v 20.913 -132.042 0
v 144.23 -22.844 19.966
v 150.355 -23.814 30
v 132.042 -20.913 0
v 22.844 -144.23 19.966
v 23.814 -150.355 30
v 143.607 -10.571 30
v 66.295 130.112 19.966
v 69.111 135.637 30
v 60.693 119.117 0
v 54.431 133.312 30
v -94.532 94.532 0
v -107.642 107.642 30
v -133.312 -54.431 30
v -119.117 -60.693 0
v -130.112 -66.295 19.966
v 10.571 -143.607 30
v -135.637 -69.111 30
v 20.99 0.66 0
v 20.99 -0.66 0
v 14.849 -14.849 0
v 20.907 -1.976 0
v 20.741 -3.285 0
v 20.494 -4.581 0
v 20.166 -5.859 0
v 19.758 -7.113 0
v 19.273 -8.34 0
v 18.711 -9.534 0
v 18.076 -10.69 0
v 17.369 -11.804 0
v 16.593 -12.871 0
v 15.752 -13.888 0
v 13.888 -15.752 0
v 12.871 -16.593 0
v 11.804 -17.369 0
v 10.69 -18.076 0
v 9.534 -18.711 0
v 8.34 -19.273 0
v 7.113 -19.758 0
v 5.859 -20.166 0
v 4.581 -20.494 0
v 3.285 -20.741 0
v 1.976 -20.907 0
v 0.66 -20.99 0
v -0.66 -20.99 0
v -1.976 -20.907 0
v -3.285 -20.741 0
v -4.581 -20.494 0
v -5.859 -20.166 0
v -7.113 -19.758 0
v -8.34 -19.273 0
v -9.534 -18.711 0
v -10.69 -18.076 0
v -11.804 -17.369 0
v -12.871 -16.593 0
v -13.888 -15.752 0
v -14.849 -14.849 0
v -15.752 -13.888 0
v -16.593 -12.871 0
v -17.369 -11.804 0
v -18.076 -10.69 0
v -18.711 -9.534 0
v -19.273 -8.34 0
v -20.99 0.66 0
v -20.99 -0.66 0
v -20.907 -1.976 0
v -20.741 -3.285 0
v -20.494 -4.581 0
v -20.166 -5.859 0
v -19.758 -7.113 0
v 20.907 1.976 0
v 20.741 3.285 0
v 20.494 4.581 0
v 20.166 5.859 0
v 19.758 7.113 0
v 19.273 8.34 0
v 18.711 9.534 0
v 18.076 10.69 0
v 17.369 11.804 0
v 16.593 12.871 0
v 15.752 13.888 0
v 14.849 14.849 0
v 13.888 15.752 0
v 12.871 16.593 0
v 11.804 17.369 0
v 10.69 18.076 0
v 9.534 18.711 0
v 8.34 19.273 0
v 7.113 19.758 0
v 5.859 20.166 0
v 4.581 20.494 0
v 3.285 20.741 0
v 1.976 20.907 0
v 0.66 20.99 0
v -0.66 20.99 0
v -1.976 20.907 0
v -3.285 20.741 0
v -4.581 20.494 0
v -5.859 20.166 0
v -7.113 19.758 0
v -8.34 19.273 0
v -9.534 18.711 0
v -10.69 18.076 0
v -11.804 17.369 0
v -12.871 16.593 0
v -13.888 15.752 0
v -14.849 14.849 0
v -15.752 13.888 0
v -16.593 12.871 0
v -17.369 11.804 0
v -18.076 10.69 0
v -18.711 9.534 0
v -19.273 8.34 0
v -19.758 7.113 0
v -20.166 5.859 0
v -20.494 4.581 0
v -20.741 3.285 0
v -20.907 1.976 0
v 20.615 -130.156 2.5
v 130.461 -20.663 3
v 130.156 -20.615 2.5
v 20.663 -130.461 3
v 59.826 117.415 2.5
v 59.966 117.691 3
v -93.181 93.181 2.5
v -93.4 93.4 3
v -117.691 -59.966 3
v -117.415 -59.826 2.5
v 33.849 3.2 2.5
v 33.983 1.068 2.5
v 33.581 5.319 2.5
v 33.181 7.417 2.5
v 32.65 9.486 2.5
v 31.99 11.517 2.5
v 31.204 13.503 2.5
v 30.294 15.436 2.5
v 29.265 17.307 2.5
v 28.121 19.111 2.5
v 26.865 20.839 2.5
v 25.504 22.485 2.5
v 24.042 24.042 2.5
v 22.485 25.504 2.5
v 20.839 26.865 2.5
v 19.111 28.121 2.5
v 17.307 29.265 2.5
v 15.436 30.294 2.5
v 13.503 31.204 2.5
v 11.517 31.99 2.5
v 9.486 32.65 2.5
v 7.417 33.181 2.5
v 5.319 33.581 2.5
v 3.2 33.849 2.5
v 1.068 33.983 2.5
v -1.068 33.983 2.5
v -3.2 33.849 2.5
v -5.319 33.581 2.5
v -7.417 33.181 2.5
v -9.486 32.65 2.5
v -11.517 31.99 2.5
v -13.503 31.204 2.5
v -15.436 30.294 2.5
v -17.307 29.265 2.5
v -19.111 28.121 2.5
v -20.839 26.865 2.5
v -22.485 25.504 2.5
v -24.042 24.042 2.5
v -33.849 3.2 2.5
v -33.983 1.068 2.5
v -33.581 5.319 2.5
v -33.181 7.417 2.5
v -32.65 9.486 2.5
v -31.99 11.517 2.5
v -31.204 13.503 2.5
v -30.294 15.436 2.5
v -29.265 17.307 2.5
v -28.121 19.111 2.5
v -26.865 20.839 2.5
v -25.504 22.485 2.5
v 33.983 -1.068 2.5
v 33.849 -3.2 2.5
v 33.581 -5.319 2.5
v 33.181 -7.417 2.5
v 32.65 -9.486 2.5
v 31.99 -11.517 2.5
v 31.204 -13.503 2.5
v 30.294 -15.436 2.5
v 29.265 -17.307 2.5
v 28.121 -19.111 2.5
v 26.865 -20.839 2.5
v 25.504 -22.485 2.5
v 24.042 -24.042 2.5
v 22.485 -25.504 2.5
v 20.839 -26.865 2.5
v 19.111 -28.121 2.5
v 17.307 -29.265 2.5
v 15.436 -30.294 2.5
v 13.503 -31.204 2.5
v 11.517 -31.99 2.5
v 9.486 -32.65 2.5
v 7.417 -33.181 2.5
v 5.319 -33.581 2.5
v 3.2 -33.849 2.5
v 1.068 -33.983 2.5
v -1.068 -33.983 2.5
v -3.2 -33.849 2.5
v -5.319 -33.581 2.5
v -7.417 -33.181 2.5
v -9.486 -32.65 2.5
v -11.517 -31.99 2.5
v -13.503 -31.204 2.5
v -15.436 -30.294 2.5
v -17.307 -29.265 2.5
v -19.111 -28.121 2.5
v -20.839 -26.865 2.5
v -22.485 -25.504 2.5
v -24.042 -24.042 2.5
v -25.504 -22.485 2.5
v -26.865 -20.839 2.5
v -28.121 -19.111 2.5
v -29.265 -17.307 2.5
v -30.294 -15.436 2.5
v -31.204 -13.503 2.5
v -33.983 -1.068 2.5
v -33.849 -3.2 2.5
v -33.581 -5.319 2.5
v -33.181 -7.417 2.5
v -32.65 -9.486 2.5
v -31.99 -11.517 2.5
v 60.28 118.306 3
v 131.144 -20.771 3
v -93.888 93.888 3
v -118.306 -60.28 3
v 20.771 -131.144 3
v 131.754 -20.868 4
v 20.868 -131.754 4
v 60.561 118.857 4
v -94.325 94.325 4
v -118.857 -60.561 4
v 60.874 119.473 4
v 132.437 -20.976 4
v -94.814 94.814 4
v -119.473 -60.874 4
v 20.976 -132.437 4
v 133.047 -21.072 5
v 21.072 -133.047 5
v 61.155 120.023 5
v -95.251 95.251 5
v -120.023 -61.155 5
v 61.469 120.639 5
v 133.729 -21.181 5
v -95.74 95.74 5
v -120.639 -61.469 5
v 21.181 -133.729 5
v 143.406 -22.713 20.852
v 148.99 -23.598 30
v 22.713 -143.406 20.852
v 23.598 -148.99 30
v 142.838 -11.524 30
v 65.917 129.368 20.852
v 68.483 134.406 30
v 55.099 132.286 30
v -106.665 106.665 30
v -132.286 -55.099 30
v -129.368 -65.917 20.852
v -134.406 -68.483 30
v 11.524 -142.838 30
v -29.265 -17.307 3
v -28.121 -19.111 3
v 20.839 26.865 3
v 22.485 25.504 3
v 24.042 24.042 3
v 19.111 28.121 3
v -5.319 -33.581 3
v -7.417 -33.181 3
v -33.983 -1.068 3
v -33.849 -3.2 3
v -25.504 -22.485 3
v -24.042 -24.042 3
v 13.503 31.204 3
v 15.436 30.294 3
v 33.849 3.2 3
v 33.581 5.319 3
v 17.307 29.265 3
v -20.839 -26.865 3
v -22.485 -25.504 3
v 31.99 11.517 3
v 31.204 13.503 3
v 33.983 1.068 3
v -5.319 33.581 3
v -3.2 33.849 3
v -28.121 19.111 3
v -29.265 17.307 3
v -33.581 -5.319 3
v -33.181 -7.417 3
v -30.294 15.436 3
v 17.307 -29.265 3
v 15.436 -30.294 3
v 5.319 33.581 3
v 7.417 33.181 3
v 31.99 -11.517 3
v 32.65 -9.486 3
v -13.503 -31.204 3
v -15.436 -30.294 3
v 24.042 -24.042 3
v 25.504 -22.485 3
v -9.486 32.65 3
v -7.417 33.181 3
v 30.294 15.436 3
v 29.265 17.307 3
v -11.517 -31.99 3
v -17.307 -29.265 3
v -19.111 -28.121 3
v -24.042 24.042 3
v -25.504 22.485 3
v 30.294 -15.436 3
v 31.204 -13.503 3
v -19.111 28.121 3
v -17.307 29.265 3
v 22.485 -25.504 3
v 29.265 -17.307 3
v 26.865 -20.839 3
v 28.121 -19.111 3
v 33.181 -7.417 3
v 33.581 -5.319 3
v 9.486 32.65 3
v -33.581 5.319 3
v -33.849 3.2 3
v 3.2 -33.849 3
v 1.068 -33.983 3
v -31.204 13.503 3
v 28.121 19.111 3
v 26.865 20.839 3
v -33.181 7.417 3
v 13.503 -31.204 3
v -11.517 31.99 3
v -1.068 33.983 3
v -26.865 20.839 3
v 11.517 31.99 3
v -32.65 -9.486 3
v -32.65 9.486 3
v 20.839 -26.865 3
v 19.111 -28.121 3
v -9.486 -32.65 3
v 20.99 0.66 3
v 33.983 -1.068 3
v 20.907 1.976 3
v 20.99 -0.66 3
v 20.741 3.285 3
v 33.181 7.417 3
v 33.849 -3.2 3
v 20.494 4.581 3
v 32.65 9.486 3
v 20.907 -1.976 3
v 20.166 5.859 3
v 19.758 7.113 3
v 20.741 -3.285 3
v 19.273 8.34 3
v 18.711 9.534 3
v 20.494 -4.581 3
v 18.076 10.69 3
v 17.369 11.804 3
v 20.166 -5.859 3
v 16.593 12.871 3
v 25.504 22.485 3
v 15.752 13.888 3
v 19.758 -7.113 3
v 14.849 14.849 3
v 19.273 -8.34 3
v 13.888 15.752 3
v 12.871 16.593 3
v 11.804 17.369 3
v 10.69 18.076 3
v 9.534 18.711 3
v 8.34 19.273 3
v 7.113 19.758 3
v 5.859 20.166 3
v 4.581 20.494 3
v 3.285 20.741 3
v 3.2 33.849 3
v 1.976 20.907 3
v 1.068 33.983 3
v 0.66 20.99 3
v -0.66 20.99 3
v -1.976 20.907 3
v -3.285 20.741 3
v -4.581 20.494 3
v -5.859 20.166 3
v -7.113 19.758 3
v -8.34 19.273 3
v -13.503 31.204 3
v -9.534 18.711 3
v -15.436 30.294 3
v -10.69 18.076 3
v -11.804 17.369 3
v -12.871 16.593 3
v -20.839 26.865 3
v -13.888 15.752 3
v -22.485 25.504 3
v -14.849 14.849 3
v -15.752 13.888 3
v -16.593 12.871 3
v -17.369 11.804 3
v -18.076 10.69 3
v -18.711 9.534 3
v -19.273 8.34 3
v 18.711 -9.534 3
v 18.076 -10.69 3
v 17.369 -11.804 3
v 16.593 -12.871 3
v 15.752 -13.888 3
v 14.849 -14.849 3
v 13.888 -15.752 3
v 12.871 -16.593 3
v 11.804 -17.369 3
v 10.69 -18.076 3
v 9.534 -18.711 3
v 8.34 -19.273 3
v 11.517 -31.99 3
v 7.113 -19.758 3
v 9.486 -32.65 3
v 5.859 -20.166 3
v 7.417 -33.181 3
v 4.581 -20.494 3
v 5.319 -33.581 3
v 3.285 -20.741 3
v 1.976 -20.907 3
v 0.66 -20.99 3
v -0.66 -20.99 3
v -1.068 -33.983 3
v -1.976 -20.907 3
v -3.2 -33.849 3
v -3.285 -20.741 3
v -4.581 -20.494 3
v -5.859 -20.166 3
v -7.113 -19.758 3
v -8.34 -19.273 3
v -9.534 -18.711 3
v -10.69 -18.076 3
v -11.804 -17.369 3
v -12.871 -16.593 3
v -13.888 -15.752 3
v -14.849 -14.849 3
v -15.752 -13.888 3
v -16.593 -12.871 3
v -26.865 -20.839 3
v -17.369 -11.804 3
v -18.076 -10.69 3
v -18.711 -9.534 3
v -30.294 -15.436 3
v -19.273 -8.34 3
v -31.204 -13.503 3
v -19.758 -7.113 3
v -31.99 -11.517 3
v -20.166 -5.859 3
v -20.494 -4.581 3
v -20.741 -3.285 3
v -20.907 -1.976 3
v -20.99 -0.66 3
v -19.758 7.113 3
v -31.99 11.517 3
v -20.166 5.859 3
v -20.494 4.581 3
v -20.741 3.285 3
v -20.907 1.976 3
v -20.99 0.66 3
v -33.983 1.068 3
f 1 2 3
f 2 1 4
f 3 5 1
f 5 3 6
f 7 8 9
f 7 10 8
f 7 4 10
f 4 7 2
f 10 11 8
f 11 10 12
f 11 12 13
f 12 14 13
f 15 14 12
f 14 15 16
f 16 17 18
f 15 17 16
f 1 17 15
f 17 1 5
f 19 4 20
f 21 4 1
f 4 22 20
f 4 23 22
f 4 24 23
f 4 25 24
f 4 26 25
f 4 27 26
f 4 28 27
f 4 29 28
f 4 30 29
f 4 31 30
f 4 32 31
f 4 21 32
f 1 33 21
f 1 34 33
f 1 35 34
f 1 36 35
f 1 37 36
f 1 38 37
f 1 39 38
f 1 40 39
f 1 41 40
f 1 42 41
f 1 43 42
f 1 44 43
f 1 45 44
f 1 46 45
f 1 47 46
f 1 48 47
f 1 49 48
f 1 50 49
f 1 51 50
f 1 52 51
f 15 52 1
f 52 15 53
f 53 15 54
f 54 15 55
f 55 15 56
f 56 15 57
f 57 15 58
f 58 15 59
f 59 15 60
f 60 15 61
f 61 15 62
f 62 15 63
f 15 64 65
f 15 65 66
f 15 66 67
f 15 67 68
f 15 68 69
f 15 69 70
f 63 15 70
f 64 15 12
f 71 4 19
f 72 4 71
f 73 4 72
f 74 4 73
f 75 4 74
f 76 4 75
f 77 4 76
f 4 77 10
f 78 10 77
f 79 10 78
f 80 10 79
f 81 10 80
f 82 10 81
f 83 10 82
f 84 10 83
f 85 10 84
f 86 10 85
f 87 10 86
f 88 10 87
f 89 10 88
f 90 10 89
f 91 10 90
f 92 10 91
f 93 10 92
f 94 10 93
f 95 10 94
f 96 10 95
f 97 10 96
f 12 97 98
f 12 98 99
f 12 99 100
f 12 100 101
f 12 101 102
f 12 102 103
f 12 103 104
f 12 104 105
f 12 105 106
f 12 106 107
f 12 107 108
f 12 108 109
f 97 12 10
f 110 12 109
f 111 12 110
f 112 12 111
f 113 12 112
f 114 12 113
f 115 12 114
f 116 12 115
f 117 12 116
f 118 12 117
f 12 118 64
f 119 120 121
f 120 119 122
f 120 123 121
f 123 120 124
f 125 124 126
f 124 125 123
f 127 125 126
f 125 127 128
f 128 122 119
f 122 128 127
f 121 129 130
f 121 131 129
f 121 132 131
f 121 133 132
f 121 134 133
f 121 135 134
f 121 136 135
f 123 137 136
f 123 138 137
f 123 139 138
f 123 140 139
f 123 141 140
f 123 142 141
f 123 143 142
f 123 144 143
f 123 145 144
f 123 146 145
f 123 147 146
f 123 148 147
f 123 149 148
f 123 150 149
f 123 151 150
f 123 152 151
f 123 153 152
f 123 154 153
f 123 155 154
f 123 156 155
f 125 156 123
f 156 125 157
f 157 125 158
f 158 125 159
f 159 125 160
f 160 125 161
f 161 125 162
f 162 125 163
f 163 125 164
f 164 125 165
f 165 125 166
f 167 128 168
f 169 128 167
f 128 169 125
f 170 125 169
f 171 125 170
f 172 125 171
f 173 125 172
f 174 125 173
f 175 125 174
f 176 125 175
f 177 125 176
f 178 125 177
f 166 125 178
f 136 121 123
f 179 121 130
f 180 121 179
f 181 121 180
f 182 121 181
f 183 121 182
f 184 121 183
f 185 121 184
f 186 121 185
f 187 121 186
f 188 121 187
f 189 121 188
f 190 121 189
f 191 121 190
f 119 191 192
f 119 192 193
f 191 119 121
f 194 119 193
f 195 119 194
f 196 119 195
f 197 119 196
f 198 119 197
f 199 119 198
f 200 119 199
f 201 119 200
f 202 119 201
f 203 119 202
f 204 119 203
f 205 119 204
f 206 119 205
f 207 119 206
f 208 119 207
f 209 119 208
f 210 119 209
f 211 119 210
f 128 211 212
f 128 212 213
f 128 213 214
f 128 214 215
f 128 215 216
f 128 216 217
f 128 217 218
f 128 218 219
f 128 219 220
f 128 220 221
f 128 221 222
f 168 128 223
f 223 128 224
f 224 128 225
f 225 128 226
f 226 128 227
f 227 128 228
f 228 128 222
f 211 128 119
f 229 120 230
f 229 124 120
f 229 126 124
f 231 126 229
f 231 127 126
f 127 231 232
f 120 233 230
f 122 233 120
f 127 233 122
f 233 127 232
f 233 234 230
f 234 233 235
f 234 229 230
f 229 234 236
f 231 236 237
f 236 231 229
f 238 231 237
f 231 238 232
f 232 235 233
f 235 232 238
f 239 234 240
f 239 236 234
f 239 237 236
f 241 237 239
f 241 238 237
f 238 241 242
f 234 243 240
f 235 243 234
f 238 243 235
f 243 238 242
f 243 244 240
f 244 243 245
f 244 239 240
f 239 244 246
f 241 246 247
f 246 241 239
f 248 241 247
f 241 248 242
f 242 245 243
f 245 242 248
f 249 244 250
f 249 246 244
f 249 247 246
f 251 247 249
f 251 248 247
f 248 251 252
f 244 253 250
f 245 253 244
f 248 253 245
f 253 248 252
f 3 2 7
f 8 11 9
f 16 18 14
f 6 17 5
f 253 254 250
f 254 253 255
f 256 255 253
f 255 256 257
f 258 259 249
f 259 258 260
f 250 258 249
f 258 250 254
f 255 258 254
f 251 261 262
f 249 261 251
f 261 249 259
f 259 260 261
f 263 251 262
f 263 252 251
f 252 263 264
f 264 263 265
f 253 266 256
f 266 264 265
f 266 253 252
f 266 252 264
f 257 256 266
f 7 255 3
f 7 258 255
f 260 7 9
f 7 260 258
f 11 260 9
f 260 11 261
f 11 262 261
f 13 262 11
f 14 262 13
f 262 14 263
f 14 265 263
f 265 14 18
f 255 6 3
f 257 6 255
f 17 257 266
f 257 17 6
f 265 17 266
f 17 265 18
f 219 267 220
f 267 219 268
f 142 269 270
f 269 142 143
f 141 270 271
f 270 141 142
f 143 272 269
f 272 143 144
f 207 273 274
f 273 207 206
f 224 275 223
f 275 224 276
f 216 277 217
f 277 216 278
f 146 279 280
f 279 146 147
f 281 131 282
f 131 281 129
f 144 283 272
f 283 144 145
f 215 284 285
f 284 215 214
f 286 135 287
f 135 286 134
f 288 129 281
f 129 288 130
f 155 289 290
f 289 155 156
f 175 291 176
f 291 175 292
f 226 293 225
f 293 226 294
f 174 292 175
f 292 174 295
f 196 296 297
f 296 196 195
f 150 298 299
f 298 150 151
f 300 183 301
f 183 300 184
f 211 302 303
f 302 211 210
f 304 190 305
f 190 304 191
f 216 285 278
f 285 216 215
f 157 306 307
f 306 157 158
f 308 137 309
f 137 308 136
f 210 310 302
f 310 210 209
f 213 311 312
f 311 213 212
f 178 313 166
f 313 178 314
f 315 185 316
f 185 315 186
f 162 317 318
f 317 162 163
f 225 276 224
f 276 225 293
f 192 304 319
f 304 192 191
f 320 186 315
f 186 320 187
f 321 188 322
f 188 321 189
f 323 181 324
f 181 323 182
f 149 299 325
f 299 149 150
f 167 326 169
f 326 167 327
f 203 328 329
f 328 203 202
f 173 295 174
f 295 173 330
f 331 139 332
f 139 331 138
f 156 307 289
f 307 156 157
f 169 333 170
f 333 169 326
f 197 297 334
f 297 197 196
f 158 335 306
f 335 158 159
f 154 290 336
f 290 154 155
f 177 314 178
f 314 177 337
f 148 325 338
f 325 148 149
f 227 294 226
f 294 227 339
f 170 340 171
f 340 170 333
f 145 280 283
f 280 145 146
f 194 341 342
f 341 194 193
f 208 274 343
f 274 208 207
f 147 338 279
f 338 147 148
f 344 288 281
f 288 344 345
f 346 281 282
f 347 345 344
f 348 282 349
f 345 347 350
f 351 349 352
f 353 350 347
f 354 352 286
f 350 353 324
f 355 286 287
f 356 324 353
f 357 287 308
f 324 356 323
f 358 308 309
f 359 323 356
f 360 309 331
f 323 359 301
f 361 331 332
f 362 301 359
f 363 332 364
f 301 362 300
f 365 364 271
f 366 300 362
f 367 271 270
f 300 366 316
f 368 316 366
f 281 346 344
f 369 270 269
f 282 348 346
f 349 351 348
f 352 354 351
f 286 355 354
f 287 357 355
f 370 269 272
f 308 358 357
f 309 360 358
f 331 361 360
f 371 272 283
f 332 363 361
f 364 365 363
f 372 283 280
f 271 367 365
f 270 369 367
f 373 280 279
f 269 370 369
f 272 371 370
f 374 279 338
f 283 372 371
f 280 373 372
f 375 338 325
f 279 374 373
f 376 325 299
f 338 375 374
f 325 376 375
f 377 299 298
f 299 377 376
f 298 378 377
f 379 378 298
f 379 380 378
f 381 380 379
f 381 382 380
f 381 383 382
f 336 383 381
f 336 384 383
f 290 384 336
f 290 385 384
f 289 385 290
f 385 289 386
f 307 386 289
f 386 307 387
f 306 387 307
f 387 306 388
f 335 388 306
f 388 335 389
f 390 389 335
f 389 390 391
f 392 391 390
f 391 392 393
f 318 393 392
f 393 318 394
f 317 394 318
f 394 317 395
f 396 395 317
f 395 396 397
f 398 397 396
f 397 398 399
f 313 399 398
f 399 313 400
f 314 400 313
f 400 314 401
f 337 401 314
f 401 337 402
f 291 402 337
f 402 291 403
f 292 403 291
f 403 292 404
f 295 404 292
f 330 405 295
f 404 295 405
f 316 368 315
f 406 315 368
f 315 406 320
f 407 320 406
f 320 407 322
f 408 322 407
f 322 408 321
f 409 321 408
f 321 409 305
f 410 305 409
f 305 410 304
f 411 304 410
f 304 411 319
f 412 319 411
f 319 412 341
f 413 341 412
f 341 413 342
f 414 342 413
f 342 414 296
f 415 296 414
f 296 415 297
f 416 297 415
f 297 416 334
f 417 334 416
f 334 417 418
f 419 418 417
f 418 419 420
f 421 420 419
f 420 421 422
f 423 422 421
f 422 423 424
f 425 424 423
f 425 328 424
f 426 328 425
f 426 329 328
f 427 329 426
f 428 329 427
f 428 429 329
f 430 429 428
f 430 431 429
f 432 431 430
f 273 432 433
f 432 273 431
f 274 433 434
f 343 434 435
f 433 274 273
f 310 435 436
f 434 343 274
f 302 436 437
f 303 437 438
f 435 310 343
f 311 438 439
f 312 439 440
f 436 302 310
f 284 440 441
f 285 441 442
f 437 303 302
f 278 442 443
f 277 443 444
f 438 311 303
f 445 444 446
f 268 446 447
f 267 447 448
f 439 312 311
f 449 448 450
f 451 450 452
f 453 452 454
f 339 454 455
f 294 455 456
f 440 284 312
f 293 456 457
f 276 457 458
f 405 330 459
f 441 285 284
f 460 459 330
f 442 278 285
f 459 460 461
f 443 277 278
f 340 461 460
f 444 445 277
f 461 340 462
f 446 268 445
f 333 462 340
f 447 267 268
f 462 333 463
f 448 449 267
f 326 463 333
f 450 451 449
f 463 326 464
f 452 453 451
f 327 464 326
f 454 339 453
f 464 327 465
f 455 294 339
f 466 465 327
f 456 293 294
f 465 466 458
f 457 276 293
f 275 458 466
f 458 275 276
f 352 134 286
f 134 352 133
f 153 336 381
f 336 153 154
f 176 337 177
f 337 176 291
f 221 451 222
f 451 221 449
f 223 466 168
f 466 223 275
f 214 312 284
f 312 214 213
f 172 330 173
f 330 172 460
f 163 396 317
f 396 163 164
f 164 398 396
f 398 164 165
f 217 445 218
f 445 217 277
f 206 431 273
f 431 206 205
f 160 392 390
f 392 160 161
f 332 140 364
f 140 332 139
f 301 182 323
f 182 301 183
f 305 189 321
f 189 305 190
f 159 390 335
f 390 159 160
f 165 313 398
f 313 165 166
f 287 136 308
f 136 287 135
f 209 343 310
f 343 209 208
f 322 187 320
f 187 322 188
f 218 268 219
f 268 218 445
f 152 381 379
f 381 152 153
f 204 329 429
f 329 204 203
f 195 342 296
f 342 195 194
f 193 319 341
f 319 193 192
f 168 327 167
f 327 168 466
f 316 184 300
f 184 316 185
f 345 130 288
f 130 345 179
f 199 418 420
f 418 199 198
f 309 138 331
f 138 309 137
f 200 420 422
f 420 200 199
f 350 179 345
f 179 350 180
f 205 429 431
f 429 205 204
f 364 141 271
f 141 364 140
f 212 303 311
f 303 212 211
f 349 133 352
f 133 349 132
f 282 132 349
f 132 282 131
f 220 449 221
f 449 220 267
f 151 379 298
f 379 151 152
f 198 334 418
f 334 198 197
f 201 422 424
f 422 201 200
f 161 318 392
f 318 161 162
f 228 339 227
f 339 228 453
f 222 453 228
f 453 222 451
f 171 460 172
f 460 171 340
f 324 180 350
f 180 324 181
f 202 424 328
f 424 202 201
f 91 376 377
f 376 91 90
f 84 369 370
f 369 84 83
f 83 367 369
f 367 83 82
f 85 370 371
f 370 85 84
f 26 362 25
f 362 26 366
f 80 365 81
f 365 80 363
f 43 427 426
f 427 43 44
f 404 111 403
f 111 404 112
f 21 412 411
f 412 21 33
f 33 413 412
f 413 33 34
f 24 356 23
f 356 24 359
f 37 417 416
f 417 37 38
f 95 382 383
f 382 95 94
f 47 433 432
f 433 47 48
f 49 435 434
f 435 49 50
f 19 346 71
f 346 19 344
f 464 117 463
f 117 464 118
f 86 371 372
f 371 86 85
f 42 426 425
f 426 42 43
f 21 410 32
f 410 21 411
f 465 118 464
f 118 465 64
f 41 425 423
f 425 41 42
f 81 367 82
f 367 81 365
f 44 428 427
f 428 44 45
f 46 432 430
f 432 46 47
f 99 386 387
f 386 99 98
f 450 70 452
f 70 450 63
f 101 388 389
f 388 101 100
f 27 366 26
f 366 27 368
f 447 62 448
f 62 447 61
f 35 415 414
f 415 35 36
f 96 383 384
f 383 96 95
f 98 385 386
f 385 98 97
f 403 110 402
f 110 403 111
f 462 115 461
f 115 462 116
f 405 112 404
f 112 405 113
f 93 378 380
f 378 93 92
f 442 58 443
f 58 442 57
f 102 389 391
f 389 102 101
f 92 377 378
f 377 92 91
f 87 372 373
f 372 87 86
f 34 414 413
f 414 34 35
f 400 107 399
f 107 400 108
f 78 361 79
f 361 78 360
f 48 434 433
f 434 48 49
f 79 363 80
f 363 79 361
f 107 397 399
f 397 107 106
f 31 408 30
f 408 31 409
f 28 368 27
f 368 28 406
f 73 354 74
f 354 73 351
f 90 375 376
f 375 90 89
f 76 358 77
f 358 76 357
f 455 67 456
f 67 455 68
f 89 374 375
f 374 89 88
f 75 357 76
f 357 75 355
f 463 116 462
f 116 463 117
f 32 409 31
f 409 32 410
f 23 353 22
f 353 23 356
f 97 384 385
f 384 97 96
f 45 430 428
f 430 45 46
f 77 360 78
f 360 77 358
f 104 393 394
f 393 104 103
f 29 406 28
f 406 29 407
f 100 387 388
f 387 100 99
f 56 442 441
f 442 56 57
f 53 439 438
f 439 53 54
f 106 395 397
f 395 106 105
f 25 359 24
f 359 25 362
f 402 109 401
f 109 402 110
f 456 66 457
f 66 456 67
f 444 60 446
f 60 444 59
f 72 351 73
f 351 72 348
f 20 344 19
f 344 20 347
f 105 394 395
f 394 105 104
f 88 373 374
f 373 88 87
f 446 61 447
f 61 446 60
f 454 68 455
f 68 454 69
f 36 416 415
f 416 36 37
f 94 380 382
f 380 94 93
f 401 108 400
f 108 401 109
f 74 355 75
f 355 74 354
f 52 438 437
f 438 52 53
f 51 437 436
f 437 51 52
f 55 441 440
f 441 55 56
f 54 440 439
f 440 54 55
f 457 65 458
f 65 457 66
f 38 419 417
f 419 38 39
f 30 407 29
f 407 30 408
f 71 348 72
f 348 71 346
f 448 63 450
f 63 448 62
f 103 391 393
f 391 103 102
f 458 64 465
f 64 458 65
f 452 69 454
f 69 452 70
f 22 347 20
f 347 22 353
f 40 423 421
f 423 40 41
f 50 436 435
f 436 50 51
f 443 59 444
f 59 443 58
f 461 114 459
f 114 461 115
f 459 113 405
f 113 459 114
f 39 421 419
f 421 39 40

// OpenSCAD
/*
 * Customizable Lamp Shade - https://www.thingiverse.com/thing:2372190
 * by Dennis Hofmann - https://www.thingiverse.com/mightynozzle/about
 * created 2017-06-08
 * version v1.0
 *
 * This work is licensed under the Creative Commons - Attribution - Non-Commercial license.
 * https://creativecommons.org/licenses/by-nc/3.0/
*/


 // Parameter Section//
//------------------//

// choose the shape of the lamp shade
lamp_shape = "dodecahedron"; //[simple,sphere,flower,dodecahedron]

// [Simple, sphere and flower shape] Resolution of round shapes. You can also use this value as the number of edges of the simple shade. If you want a cube or a pyramide, set the value of 4. If you want a cylinder or a cone, set the value of 100-255. Create a star shape with the flower shape with resolution of 3-5. Minimum value for a sphere shape is 7. You can use a low resolution (e.g. 16-32) to create a low polygon style. You can create some interesting shapes with this parameter. Just try some different values!
resolution = 64; //[3:255]

// Thinner for more translucency, thicker for more stable lamp shade. Default: 1.0
shell_thickness_in_millimeter = 1.0;

// [All lamp shapes] Set the diameter of the base of the lamp shade. The base is the position, where the bulb fitting is located. This parameter is used for all lamp shapes.
lamp_shade_base_diameter_in_millimeter = 350.0; //[1:300]

// [Simple and flower shape] Set the diameter of the head of the lamp shade. The head is the top position of the lamp shade. If this value is higher or lower than the base diameter, you get a cone or pyramide. Lower value can be used for desk lamp, higher value can be used for ceiling lamp. This parameter is used for simple and flower shape.
lamp_shade_head_diameter_in_millimeter = 10.0; //[1:300]

// [Simple and flower shape] Set the height of the lamp shade. This parameter is used for simple and flower shape
lamp_shade_height_in_millimeter = 110.0; //[1:300]

// [Sphere and dodecahedron shape] Set the cut height of the head of the shape. 0 means a closed top. It is like sclicing the top of an apple with a knife. This parameter is used for sphere and dodecahedron shape.
head_cut_height_in_millimeter = 320.0; //[0:200]

// [Sphere shape only] Set the cut height from the base of the shape. It is like sclicing the bottom of an apple with a knife. This parameter is used for sphere and dodecahedron shape.
base_cut_height_in_millimeter = 10.0;  //[0:200]

// [Flower shape only] This parameter only is used for flower shape
number_of_flower_leaves = 8; //[2:64]

// Set the diameter of the bulb bracket you want to use. Add a little extra for tolerance like 2mm if you are using a outside threaded bracket + nut/ring. If you are using a threadless bracket, it depends on the material. If it is a silicone one, you can use a little smaller hole. If it is non elastic plastic, this could be a challenge. If it is to loose, you can try to glue the gap between bracket and the lamp shade. Or do some test prints of the first 5-10 layers, before printing the whole lamp shade. Use 0, if you don't need a hole.
//bulb_bracket_diameter_in_millimeter = 0;
bulb_bracket_diameter_in_millimeter = 42.0;

// This is the additional support height for the bulb bracket. Depending on the bulb bracket you are using, this extra makes the hole more stable.
bulb_bracket_support_height_in_millimeter = 2.0;

// This is the additional support width for the bulb bracket. Depending on the bulb bracket you are using, this extra makes the hole more stable.
bulb_bracket_support_width_in_millimeter = 13.0;
//bulb_bracket_support_width_in_millimeter = 0.0;

// [Dodecahedron shape only] Extra support between walls and floor
use_dodecahedron_support = true;

// Later, perhaps (see above)
//floor_wall_support_thickness_in_millimeters = 2;
//floor_wall_support_width_in_millimeters = 6;
//floor_wall_support_height_in_millimeters = 6;

/* [Hidden] */
shape_height = lamp_shade_height_in_millimeter;
base_cut = base_cut_height_in_millimeter;
head_cut = head_cut_height_in_millimeter;
shell = shell_thickness_in_millimeter;
flower_leaves = number_of_flower_leaves;
bulb_bracket_d = bulb_bracket_diameter_in_millimeter;
bulb_bracket_support_w = bulb_bracket_support_width_in_millimeter;
bulb_bracket_support_h = bulb_bracket_support_height_in_millimeter;
shape_base_outside = lamp_shade_base_diameter_in_millimeter;
shape_head_outside = lamp_shade_head_diameter_in_millimeter;

shape_base_inside = shape_base_outside - shell * 2;
shape_head_inside = shape_head_outside - shell * 2;
$fn=resolution;


 // Program Section//
//-----------------//

// Main lampshade
color("DeepSkyBlue") rotate([0,0,45]) {
    difference() {
        union() {
            // Shape part
            if (lamp_shape == "simple") {
                simple_shape();
            } else if (lamp_shape == "sphere") {
                sphere_shape();
            } else if (lamp_shape == "flower") {
                flower_shape();
            } else if (lamp_shape == "dodecahedron") {
                if (use_dodecahedron_support) {
                    dodecahedron_support();
                }
                dodecahedron_shape();
            } else {
                echo("ERROR: Invalid lamp shade: \"", lam_shade, "\"");
            }
            
            // Bulb bracket support
            cylinder(d = bulb_bracket_d + bulb_bracket_support_w * 2, h = bulb_bracket_support_h + shell, $fn=100);
        }
        // Bottom bulb bracket hole
        translate([0,0,- 0.1]) {
            cylinder(d = bulb_bracket_d, h = shell + bulb_bracket_support_h + 0.2, $fn=100);
        }
    }
}

// Dodecahedron support
// FIXME: DIRTY HACK
module dodecahedron_support() {
    dodecahedron_shape(outside=shape_base_outside, inside=shape_base_inside-3, cut=shape_base_inside-1);
    dodecahedron_shape(outside=shape_base_outside, inside=shape_base_inside-2, cut=shape_base_inside-2);
    dodecahedron_shape(outside=shape_base_outside, inside=shape_base_inside-1, cut=shape_base_inside-3);
}

 // Module Section//
//---------------//

module simple_shape() {
    difference() {
        cylinder(d1 = shape_base_outside, d2 = shape_head_outside, h = shape_height);
        translate([0, 0, shell]) {
            cylinder(d1 = shape_base_inside, d2 = shape_head_inside, h = shape_height);
        }
    }
}

module sphere_shape() {
    translate([0, 0, shape_base_outside / 2 - base_cut]) {
        difference() {
            base_cut_sphere(shape_base_outside, base_cut);
            translate([0, 0, shell / 2]) {
                base_cut_sphere(shape_base_inside, base_cut);
            }
            // Head Cut
            translate([0, 0, shape_base_outside / 2 - head_cut]) {
                cylinder(d = shape_base_outside * 2, h = head_cut);
            }
        }
    }
}

module flower_shape() {
    difference() {
        flower(shape_base_outside, shape_head_outside);
        translate([0, 0, shell]) {
            flower(shape_base_inside, shape_head_inside);
        }
    }
}

module dodecahedron_shape(outside=shape_base_outside, inside=shape_base_inside, cut=head_cut) {
    translate([0, 0, outside / 2]) {
        difference() {
            dodecahedron(outside);
            dodecahedron(inside);
            // Head Cut
            translate([0, 0, outside / 2 - cut]) {
                cylinder(d = outside * 2, h = cut + 0.1);
            }
        }
    }
}

module base_cut_sphere(size, base) {
    difference() {
        sphere(d = size);
        // Base Cut
        translate([0, 0, - size / 2]) {
            cylinder(d = size * 2, h = base);
        }
    }
}

module dodecahedron(size) {
        scale([size, size, size]) {
        intersection() {
            cube([2, 2, 1], center = true);
            intersection_for(i = [0:4]) {
                rotate([0, 0, 72 * i]) {
                    rotate([116.565, 0, 0]) {
                        cube([2, 2, 1], center = true);
                    }
                }
            }
        }
    }
}

module flower(size1, size2) {
    leaf_diameter1 = size1 * 3 / flower_leaves;
    leaf_diameter2 = size2 * 3 / flower_leaves;
    
    difference() {
        union() {
            cylinder(d1 = size1 - leaf_diameter1,, d2 = size2 - leaf_diameter2, h = shape_height, $fn=100);
            for(leaf = [0:flower_leaves]) {
                rotate([0, 0, 360 / flower_leaves * leaf]) {
                    hull() {
                        translate([(size1 - leaf_diameter1) / 2, 0, 0]) {
                            cylinder(d = leaf_diameter1, h = 0.1);
                        }
                        translate([(size2 - leaf_diameter2) / 2, 0, shape_height]) {
                            cylinder(d = leaf_diameter2, h = 0.1);
                        }
                    }
                }        
            }
        }
        translate([0, 0, shape_height]) {
            cylinder(d = size2 + 1, h = 0.2);
        }
    }
}
